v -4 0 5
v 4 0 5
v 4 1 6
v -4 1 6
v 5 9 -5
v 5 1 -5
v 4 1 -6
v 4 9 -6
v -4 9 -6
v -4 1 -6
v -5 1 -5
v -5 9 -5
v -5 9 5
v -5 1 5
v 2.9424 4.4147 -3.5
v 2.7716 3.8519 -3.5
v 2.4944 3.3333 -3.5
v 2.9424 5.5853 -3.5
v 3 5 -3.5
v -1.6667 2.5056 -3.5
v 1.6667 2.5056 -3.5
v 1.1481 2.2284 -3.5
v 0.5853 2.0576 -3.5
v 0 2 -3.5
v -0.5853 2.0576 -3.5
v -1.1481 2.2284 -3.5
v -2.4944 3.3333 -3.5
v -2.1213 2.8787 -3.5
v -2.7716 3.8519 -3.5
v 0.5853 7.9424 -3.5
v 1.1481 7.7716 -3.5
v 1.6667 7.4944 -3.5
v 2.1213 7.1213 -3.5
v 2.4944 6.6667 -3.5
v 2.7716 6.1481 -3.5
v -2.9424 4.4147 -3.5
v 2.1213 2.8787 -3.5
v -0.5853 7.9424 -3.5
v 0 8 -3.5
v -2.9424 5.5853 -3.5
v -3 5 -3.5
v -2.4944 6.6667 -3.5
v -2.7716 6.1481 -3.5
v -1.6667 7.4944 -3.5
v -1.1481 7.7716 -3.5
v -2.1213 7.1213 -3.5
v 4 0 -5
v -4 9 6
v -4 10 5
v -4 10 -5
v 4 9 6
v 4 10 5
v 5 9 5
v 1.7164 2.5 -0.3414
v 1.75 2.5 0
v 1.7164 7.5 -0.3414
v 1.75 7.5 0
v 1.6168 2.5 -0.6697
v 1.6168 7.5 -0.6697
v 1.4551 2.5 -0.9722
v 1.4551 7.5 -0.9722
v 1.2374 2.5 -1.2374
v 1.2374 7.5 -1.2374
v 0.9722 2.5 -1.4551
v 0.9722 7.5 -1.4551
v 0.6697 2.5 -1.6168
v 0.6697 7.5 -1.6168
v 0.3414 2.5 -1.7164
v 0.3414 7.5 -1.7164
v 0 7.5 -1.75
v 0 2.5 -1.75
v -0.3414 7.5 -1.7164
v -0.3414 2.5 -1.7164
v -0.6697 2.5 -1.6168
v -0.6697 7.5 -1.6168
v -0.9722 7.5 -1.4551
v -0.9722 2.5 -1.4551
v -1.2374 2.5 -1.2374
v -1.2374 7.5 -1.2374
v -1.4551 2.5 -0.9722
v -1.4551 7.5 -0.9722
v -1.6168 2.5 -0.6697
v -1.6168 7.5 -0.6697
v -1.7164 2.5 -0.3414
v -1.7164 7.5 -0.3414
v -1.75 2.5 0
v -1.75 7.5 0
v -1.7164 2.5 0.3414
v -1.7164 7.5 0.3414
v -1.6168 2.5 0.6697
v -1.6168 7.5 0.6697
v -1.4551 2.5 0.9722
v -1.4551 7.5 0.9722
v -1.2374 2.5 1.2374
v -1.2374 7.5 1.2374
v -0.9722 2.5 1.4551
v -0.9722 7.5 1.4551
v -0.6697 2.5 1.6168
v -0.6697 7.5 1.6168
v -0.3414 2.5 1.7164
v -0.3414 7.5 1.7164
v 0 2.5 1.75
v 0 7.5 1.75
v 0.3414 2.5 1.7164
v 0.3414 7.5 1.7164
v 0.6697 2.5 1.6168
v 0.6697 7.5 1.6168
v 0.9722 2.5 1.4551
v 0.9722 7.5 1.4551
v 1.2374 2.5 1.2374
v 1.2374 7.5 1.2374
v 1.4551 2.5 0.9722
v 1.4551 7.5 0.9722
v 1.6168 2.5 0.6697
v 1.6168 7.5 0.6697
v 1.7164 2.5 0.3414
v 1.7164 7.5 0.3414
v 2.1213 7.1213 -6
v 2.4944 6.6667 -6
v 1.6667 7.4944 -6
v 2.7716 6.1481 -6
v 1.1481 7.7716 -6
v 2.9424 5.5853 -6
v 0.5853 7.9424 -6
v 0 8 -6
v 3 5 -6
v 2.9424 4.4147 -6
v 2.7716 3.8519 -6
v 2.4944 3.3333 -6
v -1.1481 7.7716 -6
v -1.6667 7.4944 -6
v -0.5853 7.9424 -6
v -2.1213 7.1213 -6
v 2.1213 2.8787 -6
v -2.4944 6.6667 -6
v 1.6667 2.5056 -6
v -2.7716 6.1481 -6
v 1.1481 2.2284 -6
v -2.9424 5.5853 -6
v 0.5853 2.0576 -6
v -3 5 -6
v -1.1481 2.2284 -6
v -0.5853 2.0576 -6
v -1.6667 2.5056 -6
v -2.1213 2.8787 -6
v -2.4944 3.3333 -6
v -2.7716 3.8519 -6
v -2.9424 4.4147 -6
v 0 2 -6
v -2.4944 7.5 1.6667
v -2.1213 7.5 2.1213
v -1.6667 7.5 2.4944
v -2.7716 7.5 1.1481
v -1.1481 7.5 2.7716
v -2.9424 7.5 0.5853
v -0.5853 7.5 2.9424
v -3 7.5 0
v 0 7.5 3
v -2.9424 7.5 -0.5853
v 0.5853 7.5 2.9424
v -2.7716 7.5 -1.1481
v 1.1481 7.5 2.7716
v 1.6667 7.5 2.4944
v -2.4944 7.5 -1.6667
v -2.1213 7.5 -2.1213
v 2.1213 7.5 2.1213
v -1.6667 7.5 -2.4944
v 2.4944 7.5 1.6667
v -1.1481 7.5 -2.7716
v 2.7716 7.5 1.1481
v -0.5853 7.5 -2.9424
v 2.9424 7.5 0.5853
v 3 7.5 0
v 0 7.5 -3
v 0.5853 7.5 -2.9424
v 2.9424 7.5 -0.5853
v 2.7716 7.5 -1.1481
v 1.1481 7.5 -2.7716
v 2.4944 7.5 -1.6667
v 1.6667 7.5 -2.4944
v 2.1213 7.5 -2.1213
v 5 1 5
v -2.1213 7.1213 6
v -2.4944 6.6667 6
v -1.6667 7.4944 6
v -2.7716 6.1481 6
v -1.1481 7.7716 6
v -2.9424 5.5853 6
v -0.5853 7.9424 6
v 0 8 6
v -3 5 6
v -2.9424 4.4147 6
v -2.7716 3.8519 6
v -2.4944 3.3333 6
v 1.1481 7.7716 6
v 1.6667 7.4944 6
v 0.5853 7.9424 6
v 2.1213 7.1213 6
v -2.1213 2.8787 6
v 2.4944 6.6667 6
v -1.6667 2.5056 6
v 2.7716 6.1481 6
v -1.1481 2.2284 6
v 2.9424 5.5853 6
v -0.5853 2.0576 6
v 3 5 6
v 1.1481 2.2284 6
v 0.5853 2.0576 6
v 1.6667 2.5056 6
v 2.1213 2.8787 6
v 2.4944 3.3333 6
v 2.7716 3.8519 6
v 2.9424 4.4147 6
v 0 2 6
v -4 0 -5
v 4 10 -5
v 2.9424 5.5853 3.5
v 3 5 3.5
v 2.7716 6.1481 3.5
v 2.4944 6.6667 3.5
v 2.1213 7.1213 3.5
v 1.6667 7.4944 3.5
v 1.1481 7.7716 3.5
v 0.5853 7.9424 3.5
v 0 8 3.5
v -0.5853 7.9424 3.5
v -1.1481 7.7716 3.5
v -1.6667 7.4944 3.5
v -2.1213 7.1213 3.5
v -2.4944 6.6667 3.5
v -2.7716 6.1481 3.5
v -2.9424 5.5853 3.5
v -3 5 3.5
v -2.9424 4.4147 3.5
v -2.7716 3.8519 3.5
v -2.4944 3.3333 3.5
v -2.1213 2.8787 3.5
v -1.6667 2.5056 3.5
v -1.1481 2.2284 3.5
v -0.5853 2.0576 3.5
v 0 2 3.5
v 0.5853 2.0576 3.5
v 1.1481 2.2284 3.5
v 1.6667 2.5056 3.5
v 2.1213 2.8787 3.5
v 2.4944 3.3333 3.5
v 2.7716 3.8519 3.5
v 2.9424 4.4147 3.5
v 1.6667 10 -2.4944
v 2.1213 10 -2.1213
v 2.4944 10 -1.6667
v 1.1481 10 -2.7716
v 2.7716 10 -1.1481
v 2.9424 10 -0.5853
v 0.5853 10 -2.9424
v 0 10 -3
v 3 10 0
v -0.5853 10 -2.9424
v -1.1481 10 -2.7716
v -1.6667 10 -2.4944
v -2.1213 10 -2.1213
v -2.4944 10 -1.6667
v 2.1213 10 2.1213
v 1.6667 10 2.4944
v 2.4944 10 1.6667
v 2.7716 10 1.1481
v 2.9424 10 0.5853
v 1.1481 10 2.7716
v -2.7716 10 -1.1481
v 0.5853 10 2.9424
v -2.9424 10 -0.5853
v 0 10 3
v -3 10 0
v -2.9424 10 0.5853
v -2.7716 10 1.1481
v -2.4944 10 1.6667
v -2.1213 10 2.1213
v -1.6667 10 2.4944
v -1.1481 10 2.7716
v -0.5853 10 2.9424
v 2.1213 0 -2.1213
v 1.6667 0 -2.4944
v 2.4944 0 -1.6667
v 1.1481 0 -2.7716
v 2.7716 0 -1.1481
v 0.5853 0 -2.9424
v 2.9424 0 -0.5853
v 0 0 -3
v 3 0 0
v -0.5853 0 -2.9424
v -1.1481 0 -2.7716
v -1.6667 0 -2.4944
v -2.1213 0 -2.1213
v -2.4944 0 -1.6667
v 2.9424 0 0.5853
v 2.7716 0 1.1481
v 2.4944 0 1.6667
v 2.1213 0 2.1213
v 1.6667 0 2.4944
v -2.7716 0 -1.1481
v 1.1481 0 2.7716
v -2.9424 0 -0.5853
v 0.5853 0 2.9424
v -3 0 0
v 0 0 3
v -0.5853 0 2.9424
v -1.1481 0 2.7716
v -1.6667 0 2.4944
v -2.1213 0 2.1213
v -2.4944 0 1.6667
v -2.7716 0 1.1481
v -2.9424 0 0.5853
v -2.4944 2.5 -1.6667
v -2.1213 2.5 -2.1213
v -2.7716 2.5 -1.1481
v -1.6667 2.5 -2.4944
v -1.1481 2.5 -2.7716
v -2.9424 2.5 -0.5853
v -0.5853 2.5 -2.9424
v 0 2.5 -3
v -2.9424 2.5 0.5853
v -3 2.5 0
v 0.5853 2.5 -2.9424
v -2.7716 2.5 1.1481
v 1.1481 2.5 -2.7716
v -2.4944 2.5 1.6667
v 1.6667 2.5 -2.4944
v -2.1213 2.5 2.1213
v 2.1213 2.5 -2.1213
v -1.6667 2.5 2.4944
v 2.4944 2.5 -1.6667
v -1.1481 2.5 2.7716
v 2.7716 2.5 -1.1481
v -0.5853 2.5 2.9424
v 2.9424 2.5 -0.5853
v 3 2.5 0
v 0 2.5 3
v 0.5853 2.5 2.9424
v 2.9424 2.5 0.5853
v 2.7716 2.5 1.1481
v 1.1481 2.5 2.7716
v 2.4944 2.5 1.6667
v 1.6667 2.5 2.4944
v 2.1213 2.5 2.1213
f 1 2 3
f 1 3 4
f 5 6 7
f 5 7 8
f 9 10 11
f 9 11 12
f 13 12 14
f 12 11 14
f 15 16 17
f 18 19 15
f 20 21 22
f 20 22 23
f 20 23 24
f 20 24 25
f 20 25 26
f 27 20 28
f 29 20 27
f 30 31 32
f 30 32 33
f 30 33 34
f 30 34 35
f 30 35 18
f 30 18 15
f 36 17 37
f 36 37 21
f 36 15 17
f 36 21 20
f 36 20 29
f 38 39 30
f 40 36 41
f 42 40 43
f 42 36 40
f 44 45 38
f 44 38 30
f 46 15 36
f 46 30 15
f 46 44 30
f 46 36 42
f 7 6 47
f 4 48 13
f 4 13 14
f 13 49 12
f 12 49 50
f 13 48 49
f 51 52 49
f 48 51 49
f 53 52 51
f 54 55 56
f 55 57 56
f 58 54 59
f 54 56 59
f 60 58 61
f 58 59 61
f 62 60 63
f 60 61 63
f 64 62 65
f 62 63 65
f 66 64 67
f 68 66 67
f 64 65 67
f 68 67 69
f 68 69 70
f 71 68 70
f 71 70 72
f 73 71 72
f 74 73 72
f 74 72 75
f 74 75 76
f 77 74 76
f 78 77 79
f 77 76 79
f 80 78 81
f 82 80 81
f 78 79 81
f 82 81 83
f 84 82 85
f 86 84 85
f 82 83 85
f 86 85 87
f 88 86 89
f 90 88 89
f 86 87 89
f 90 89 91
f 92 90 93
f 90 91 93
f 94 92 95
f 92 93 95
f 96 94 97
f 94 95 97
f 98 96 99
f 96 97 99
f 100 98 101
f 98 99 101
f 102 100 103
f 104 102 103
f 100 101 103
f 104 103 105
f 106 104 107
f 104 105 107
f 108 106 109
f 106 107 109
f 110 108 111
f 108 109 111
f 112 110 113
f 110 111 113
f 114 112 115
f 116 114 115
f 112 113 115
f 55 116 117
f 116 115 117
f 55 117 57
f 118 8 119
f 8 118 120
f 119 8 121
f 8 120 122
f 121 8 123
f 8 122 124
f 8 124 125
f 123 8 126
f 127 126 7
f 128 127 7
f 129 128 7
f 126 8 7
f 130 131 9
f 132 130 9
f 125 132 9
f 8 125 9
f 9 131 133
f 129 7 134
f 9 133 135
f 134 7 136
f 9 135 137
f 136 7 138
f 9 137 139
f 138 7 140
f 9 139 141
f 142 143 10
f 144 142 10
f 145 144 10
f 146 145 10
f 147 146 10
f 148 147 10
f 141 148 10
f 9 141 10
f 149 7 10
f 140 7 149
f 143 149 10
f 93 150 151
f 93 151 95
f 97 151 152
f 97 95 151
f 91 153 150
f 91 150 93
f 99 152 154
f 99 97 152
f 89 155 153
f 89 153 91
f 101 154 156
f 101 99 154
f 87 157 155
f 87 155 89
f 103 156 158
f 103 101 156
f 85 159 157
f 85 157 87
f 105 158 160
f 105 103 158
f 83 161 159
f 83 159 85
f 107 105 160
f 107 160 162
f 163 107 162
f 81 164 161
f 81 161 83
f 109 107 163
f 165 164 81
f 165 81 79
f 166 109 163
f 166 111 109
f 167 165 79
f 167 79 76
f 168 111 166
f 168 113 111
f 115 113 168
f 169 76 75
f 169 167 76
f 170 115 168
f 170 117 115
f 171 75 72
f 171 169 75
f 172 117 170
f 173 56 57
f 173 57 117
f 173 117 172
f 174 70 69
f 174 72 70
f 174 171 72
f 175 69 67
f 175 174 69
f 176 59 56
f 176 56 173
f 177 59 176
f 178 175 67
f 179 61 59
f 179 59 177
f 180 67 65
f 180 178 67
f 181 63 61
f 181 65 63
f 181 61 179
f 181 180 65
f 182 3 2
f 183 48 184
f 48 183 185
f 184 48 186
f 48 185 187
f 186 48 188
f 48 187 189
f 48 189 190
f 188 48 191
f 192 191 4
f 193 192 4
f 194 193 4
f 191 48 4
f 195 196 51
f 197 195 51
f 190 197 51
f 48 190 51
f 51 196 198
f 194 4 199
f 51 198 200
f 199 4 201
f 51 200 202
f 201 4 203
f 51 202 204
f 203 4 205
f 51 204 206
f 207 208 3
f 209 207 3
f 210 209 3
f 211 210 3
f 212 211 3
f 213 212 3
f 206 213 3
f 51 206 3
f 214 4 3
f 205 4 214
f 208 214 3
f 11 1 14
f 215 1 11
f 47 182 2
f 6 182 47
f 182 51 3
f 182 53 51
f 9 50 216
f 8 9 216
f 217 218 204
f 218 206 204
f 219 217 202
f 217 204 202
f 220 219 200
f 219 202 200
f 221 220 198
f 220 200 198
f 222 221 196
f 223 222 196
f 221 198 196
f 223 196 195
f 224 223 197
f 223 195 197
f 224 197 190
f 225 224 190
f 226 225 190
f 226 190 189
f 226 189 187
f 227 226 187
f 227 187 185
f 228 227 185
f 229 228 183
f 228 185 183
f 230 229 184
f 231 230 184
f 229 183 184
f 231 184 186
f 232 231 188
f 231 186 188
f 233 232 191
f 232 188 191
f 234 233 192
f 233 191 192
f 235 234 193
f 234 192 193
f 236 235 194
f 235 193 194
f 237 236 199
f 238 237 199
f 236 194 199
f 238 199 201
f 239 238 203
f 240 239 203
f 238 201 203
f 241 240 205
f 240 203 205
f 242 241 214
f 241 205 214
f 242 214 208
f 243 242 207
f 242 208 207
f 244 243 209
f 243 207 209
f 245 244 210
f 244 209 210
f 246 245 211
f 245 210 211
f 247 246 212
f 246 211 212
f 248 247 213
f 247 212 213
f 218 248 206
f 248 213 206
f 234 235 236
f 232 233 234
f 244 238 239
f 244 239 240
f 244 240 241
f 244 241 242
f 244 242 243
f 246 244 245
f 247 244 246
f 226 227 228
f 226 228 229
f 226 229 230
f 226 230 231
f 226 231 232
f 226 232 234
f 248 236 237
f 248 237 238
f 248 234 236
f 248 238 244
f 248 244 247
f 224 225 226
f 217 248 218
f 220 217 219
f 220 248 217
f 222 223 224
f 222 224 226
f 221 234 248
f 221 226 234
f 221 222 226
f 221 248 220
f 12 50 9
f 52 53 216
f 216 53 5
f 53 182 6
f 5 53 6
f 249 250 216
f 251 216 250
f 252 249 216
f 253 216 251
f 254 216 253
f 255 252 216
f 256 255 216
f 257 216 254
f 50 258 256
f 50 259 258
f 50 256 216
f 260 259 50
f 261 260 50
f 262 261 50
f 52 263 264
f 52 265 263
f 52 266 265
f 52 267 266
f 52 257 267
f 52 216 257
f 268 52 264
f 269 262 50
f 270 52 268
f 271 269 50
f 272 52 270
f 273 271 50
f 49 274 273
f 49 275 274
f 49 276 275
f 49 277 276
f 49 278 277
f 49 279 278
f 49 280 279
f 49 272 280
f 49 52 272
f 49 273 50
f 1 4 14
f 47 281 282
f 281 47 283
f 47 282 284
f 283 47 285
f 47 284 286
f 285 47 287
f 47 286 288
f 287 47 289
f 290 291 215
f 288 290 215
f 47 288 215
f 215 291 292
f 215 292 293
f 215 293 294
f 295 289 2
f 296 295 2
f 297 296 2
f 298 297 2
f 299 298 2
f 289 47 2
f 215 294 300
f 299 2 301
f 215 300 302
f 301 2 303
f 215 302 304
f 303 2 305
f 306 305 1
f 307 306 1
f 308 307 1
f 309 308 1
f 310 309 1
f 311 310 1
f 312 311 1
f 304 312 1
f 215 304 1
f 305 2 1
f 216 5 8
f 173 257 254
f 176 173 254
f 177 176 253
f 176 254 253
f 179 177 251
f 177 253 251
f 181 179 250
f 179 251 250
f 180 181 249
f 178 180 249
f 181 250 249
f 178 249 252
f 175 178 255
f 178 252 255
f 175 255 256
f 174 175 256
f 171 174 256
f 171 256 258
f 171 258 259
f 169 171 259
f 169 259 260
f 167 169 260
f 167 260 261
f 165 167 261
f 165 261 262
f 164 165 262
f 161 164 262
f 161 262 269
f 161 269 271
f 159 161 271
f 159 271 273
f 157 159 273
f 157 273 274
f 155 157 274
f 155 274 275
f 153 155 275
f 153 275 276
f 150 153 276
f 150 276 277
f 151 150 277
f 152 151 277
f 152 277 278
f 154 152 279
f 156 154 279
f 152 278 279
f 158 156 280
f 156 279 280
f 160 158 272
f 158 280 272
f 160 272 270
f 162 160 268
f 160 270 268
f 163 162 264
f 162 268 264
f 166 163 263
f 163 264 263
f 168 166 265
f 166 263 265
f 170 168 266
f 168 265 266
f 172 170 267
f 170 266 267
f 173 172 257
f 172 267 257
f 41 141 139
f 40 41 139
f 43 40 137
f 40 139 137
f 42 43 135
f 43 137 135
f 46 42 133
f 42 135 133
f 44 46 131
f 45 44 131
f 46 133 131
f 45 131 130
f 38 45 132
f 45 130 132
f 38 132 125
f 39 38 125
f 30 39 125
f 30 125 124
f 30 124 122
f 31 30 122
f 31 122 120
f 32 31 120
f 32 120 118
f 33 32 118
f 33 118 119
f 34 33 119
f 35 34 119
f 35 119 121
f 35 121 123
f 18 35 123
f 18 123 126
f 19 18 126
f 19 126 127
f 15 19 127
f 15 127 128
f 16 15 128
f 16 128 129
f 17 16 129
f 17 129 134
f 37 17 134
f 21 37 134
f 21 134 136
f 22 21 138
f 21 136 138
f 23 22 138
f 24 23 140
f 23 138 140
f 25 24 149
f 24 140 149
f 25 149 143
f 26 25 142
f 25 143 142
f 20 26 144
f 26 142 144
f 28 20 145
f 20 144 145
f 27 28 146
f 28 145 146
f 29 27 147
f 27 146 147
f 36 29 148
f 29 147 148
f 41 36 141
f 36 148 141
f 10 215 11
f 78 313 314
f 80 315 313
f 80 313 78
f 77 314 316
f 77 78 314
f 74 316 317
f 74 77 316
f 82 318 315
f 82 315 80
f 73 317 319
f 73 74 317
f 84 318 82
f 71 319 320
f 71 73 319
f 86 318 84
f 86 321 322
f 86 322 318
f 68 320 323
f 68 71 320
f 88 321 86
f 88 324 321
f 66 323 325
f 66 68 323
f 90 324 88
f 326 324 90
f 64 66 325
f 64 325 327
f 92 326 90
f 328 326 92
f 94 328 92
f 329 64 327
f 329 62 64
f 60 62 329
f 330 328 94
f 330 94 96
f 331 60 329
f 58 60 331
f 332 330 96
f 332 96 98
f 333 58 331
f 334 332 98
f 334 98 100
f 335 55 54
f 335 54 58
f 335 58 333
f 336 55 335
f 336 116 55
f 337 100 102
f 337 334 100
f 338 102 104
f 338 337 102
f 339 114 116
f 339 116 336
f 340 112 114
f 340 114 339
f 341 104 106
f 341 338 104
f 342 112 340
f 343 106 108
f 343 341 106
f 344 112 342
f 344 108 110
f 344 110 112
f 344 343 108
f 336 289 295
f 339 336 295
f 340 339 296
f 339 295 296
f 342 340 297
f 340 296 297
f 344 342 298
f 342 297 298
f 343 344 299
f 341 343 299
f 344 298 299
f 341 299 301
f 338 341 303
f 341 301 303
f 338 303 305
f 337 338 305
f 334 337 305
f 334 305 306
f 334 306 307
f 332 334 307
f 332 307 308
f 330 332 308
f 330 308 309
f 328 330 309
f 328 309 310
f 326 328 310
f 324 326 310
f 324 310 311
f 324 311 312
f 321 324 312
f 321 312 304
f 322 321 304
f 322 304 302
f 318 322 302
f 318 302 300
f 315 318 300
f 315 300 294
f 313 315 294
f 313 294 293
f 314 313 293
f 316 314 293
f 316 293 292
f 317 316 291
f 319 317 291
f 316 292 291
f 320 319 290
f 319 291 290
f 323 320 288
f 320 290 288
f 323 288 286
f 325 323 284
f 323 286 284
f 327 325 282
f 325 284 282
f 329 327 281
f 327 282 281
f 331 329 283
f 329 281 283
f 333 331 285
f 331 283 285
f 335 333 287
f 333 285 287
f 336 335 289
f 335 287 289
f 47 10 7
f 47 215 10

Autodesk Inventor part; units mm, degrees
ref_plane "YZ Plane" through (0, 0, 0) normal (1, 0, 0) x (0, 1, 0)
ref_plane "XZ Plane" through (0, 0, 0) normal (0, 1, 0) x (-1, 0, 0)
ref_plane "XY Plane" through (0, 0, 0) normal (0, 0, 1) x (1, 0, 0)
sketch "Esquisse1" plane through (0, 0, 0) normal (0, 1, 0) x (-1, 0, 0)
  line L0 (5, 6) -> (-5, 6)
  line L1 (-5, 6) -> (-5, -6)
  line L2 (-5, -6) -> (5, -6)
  line L3 (5, -6) -> (5, 6)
  point P0 (0, 0)
  dimension "d0" = 10
  dimension "d1" = 5
  dimension "d2" = 6
  dimension "d3" = 6
extrude "Extrusion1" add sketch "Esquisse1" along normal blind 10
sketch "Esquisse2" plane through (-5, 0, 6) normal (0, 0, 1) x (1, 0, 0)
  circle A0 centre (5, 5) radius 3
  line L0 (0, 0) -> (0, 10) projected
  point P0 (5, 0)
  dimension "d6" = 6
  dimension "d7" = 5
  dimension "d8" = 5
extrude "Extrusion2" cut sketch "Esquisse2" against normal blind 2.5
sketch "Esquisse3" plane through (5, 0, -6) normal (0, 0, -1) x (-1, 0, 0)
  circle A0 centre (5, 5) radius 3 projected
  point P0 (5, 0)
extrude "Extrusion3" cut sketch "Esquisse3" against normal blind 2.5
sketch "Esquisse4" plane through (0, 0, 0) normal (0, -1, 0) x (1, 0, 0)
  circle A0 centre (0, 0) radius 3
  dimension "d13" = 6
extrude "Extrusion4" cut sketch "Esquisse4" against normal blind 2.5
sketch "Esquisse5" plane through (0, 10, 0) normal (0, 1, 0) x (1, 0, 0)
  circle A0 centre (0, 0) radius 3 projected
  circle A1 centre (0, 0) radius 3 projected
extrude "Extrusion5" cut sketch "Esquisse5" against normal blind 2.5
sketch "Esquisse6" plane through (0, 7.5, 0) normal (0, 1, 0) x (1, 0, 0)
  circle A0 centre (0, 0) radius 1.75
  dimension "d18" = 3.5
extrude "Extrusion6" cut sketch "Esquisse6" against normal up to surface (5 mm away)
chamfer "Chanfrein1" distance 1 angle 45 12 edges at (5, 10, 0) (0, 10, 6) (5, 5, 6) (-5, 5, 6) (0, 0, 6) (5, 0, 0) (5, 5, -6) (0, 0, -6) (-5, 0, 0) (-5, 10, 0) (0, 10, -6) (-5, 5, -6)
properties part number "piece roulement"
